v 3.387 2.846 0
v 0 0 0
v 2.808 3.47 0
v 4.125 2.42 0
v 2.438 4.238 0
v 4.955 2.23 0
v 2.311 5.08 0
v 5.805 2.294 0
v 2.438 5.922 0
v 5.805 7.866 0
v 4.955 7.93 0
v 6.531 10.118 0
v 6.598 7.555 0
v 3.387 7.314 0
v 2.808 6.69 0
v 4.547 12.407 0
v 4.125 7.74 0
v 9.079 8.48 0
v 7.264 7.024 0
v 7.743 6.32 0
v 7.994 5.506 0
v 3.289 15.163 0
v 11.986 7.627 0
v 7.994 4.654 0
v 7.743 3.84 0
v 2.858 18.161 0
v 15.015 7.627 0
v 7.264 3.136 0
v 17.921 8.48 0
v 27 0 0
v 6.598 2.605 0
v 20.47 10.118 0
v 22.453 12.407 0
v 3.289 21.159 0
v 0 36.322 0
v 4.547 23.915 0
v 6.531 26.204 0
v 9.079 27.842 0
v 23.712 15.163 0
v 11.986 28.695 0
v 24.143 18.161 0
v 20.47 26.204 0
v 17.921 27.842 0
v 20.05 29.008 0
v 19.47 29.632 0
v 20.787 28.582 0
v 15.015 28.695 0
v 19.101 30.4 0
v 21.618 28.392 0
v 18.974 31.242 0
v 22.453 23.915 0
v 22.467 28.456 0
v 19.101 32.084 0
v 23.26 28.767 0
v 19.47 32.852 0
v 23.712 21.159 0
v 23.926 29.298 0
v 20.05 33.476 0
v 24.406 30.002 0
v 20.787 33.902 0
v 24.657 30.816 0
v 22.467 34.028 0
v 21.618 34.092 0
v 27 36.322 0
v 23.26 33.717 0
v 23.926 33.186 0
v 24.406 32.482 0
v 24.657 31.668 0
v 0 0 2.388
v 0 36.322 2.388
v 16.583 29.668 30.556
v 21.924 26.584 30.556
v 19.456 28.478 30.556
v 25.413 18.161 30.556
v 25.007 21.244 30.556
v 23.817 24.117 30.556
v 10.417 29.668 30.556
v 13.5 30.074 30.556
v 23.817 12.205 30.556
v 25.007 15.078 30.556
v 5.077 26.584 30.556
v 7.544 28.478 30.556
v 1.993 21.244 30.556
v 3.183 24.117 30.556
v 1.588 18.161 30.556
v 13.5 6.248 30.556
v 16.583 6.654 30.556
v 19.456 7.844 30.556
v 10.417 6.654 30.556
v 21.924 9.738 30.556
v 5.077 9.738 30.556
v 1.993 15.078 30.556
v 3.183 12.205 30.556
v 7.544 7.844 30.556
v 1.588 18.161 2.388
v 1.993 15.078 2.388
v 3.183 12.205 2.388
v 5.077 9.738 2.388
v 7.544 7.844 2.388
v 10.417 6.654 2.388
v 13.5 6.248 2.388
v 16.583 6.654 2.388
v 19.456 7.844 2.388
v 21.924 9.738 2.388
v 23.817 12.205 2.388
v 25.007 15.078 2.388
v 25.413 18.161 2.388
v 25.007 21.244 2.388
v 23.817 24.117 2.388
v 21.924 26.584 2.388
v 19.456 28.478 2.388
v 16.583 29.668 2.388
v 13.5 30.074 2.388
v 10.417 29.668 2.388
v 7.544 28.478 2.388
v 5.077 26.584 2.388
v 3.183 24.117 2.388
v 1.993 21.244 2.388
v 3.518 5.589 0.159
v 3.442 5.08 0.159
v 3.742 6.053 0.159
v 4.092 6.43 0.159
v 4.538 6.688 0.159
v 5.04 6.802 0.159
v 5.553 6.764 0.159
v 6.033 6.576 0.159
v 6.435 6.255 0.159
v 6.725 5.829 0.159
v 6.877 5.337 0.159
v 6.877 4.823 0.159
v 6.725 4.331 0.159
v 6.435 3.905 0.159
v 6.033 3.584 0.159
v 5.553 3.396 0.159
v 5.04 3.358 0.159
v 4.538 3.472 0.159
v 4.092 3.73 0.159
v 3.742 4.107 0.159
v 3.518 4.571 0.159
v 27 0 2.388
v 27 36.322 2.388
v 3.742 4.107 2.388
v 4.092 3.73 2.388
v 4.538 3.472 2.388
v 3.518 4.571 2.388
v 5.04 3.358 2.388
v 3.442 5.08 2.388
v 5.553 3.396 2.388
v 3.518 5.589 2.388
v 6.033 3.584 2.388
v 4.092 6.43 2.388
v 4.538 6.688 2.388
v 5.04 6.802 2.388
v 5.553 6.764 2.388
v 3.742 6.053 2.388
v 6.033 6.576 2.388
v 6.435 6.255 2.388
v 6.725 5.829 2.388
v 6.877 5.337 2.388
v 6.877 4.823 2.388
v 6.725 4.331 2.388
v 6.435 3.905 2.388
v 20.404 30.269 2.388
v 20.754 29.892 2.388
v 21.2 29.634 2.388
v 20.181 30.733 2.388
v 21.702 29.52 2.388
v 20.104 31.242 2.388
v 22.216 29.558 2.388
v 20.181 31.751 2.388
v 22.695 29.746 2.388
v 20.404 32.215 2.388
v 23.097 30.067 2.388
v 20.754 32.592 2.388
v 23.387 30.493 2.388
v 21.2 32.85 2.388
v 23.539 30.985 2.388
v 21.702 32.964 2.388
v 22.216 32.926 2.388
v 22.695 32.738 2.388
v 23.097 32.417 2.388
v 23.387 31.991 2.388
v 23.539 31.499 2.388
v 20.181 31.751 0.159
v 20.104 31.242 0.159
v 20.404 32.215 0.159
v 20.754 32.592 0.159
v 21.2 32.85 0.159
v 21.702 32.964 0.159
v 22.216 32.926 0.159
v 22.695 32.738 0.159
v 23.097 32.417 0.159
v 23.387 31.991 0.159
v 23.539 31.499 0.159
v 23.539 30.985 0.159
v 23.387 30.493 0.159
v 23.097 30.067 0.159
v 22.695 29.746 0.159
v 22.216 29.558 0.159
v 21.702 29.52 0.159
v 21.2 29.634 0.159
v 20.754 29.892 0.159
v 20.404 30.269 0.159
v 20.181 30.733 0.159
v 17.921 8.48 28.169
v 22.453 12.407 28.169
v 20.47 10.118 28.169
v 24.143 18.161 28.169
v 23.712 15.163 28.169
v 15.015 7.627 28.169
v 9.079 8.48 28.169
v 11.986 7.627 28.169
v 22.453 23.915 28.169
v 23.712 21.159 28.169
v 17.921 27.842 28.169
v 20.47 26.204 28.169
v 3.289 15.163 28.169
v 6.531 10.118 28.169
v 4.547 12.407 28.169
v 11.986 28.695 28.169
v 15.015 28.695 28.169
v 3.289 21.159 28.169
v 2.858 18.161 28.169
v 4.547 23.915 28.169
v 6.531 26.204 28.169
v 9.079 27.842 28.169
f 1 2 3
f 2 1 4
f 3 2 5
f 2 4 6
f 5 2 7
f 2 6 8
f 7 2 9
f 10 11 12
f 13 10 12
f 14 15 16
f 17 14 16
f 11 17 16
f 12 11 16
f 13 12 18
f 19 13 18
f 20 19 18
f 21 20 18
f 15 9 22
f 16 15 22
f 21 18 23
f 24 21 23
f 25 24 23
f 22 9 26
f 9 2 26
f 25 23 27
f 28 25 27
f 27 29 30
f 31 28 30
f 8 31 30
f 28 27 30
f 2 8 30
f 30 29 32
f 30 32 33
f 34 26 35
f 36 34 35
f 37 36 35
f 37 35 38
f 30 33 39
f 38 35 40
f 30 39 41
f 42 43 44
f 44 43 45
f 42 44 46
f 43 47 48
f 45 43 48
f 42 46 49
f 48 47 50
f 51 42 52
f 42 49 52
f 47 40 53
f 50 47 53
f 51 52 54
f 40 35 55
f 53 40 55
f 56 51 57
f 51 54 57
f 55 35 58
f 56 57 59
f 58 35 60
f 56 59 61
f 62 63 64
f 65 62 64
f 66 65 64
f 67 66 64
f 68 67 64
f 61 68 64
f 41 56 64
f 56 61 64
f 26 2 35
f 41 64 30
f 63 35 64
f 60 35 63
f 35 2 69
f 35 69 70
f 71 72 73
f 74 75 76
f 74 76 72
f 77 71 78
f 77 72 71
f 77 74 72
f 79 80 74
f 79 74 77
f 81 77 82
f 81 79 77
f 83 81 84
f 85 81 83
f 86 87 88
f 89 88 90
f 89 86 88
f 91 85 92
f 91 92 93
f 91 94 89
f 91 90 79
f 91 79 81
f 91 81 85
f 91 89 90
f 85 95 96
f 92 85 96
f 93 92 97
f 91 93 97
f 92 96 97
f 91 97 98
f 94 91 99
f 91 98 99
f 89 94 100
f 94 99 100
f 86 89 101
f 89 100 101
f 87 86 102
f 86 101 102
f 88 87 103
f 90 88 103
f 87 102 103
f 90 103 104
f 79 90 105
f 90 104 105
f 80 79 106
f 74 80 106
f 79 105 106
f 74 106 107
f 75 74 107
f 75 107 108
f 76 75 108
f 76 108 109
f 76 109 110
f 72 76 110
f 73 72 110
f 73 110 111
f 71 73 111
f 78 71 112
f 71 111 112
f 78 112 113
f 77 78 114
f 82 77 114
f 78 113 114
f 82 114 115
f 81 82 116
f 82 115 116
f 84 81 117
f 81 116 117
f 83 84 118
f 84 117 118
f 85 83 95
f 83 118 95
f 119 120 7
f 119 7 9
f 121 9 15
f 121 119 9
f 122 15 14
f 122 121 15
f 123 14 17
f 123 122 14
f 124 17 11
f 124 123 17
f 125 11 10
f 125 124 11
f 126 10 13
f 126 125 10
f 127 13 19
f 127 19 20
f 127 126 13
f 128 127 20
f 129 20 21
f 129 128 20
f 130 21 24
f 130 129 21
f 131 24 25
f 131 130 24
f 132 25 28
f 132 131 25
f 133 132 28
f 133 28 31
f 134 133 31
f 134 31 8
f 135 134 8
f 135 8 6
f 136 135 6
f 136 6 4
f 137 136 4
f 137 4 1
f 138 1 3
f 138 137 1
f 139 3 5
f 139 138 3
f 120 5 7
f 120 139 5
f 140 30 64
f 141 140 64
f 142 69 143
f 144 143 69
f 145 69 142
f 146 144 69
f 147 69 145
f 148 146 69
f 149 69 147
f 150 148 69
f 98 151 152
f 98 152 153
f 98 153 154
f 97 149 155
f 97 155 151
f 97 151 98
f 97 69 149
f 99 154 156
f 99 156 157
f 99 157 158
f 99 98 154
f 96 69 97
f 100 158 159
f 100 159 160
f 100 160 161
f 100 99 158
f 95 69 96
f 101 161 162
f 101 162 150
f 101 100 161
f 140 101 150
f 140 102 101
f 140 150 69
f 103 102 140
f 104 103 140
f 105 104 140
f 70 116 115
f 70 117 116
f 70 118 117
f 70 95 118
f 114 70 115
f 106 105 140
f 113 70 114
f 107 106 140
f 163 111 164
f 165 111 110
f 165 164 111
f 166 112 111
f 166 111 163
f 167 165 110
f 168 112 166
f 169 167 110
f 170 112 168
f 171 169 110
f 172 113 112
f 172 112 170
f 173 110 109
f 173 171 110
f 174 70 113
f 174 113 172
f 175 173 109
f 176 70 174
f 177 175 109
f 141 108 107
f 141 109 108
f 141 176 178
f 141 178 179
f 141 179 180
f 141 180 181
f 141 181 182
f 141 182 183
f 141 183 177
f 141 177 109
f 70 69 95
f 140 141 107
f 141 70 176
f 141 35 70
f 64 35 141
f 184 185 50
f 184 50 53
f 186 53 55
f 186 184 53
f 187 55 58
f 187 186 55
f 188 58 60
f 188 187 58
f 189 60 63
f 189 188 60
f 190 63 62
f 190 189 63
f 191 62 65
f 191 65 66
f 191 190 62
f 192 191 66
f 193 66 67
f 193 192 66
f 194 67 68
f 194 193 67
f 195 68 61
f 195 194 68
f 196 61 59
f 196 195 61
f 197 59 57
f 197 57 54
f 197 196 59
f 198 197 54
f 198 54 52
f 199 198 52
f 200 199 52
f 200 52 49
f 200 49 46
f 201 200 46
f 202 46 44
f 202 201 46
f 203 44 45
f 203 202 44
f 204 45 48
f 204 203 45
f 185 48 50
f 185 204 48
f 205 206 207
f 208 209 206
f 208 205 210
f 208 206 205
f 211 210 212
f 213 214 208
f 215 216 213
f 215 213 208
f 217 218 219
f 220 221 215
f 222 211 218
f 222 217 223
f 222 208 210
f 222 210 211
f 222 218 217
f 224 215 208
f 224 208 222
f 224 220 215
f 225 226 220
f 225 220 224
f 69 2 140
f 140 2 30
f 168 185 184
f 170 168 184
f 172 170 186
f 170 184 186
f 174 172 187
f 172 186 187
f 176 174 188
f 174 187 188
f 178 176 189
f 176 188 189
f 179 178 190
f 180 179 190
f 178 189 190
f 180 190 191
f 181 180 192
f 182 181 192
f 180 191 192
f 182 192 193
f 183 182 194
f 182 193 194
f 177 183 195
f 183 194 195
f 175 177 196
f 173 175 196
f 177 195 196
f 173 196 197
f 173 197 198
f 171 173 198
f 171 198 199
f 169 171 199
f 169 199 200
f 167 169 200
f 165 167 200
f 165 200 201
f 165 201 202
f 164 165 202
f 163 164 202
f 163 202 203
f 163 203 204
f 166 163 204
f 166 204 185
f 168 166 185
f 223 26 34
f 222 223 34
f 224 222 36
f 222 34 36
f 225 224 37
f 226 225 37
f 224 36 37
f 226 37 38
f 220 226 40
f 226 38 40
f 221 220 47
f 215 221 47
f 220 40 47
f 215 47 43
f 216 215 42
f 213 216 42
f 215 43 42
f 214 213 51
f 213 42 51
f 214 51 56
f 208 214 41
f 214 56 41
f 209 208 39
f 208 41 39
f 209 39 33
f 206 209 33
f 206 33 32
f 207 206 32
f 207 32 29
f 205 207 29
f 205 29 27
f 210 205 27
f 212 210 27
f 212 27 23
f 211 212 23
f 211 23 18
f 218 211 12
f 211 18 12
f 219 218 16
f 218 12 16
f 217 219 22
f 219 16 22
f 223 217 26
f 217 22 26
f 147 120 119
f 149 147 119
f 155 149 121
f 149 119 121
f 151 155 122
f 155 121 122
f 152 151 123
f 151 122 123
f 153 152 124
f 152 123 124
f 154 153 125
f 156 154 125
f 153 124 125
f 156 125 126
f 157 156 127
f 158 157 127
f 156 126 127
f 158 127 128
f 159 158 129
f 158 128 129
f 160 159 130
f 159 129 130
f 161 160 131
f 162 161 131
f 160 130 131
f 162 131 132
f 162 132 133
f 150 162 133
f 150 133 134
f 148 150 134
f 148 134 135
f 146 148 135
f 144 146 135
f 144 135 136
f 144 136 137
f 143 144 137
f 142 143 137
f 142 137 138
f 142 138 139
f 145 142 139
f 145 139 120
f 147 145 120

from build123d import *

# Parameters (mm, degrees)
SKETCH1_W           = 27.0002
SKETCH1_H           = 36.322
BOSS_EXTRUDE1_DEPTH = 2.3876
SKETCH2_R           = 11.9126
BOSS_EXTRUDE2_DEPTH = 28.1686
SKETCH3_R           = 10.6426
CUT_EXTRUDE1_DEPTH  = 28.1686
CUT_EXTRUDE2_REACH  = 56.608
SKETCH4_R           = 1.7272
CHAMFER1_SIZE       = 1.1303
CHAMFER1_SIZE2      = 0.158853305


with BuildPart() as part:
    # Sketch1 → Boss-Extrude1 (new body)
    with BuildSketch(Plane.XY):
        with Locations((13.5001, 18.161)):
            Rectangle(SKETCH1_W, SKETCH1_H)
    extrude(amount=BOSS_EXTRUDE1_DEPTH)

    # Sketch2 → Boss-Extrude2 (add)
    with BuildSketch(Plane.XY.offset(2.3876)):
        with Locations(Location((13.5001, 18.161, 0), (0, 0, 180))):
            Circle(SKETCH2_R)
    extrude(amount=BOSS_EXTRUDE2_DEPTH)

    # Sketch3 → Cut-Extrude1 (cut)
    with BuildSketch(Plane(origin=(0, 0, 0), x_dir=(-1, 0, 0), z_dir=(0, 0, -1))):
        with Locations((-13.5001, 18.161)):
            Circle(SKETCH3_R)
    extrude(amount=-CUT_EXTRUDE1_DEPTH, mode=Mode.SUBTRACT)

    # Sketch4 → Cut-Extrude2 (cut, up to next)
    with BuildSketch(Plane(origin=(0, 0, 0), x_dir=(-1, 0, 0), z_dir=(0, 0, -1)), mode=Mode.PRIVATE) as cut_extrude2_sk1:
        with Locations((-21.8313, 31.242)):
            Circle(SKETCH4_R)
    cut_extrude2_tool1 = extrude(cut_extrude2_sk1.sketch, amount=-CUT_EXTRUDE2_REACH, mode=Mode.PRIVATE) & part.part
    # Sketch4 → Cut-Extrude2 (cut, up to next)
    with BuildSketch(Plane(origin=(0, 0, 0), x_dir=(-1, 0, 0), z_dir=(0, 0, -1)), mode=Mode.PRIVATE) as cut_extrude2_sk2:
        with Locations((-5.1689, 5.08)):
            Circle(SKETCH4_R)
    cut_extrude2_tool2 = extrude(cut_extrude2_sk2.sketch, amount=-CUT_EXTRUDE2_REACH, mode=Mode.PRIVATE) & part.part
    add(cut_extrude2_tool1.solids().sort_by_distance((21.8313, 31.242, 0))[0], mode=Mode.SUBTRACT)
    add(cut_extrude2_tool2.solids().sort_by_distance((5.1689, 5.08, 0))[0], mode=Mode.SUBTRACT)

    # Chamfer1
    chamfer1_edges = [part.edges().sort_by_distance(p)[0] for p in [
        (23.5585, 31.242, 0),
        (6.8961, 5.08, 0),
    ]]
    chamfer1_side = [part.faces().sort_by_distance(p)[0] for p in [
        (13.5001, 0.452581317, 0),
    ]]
    chamfer(chamfer1_edges, length=CHAMFER1_SIZE, length2=CHAMFER1_SIZE2, reference=chamfer1_side[0])


solid = part.part
